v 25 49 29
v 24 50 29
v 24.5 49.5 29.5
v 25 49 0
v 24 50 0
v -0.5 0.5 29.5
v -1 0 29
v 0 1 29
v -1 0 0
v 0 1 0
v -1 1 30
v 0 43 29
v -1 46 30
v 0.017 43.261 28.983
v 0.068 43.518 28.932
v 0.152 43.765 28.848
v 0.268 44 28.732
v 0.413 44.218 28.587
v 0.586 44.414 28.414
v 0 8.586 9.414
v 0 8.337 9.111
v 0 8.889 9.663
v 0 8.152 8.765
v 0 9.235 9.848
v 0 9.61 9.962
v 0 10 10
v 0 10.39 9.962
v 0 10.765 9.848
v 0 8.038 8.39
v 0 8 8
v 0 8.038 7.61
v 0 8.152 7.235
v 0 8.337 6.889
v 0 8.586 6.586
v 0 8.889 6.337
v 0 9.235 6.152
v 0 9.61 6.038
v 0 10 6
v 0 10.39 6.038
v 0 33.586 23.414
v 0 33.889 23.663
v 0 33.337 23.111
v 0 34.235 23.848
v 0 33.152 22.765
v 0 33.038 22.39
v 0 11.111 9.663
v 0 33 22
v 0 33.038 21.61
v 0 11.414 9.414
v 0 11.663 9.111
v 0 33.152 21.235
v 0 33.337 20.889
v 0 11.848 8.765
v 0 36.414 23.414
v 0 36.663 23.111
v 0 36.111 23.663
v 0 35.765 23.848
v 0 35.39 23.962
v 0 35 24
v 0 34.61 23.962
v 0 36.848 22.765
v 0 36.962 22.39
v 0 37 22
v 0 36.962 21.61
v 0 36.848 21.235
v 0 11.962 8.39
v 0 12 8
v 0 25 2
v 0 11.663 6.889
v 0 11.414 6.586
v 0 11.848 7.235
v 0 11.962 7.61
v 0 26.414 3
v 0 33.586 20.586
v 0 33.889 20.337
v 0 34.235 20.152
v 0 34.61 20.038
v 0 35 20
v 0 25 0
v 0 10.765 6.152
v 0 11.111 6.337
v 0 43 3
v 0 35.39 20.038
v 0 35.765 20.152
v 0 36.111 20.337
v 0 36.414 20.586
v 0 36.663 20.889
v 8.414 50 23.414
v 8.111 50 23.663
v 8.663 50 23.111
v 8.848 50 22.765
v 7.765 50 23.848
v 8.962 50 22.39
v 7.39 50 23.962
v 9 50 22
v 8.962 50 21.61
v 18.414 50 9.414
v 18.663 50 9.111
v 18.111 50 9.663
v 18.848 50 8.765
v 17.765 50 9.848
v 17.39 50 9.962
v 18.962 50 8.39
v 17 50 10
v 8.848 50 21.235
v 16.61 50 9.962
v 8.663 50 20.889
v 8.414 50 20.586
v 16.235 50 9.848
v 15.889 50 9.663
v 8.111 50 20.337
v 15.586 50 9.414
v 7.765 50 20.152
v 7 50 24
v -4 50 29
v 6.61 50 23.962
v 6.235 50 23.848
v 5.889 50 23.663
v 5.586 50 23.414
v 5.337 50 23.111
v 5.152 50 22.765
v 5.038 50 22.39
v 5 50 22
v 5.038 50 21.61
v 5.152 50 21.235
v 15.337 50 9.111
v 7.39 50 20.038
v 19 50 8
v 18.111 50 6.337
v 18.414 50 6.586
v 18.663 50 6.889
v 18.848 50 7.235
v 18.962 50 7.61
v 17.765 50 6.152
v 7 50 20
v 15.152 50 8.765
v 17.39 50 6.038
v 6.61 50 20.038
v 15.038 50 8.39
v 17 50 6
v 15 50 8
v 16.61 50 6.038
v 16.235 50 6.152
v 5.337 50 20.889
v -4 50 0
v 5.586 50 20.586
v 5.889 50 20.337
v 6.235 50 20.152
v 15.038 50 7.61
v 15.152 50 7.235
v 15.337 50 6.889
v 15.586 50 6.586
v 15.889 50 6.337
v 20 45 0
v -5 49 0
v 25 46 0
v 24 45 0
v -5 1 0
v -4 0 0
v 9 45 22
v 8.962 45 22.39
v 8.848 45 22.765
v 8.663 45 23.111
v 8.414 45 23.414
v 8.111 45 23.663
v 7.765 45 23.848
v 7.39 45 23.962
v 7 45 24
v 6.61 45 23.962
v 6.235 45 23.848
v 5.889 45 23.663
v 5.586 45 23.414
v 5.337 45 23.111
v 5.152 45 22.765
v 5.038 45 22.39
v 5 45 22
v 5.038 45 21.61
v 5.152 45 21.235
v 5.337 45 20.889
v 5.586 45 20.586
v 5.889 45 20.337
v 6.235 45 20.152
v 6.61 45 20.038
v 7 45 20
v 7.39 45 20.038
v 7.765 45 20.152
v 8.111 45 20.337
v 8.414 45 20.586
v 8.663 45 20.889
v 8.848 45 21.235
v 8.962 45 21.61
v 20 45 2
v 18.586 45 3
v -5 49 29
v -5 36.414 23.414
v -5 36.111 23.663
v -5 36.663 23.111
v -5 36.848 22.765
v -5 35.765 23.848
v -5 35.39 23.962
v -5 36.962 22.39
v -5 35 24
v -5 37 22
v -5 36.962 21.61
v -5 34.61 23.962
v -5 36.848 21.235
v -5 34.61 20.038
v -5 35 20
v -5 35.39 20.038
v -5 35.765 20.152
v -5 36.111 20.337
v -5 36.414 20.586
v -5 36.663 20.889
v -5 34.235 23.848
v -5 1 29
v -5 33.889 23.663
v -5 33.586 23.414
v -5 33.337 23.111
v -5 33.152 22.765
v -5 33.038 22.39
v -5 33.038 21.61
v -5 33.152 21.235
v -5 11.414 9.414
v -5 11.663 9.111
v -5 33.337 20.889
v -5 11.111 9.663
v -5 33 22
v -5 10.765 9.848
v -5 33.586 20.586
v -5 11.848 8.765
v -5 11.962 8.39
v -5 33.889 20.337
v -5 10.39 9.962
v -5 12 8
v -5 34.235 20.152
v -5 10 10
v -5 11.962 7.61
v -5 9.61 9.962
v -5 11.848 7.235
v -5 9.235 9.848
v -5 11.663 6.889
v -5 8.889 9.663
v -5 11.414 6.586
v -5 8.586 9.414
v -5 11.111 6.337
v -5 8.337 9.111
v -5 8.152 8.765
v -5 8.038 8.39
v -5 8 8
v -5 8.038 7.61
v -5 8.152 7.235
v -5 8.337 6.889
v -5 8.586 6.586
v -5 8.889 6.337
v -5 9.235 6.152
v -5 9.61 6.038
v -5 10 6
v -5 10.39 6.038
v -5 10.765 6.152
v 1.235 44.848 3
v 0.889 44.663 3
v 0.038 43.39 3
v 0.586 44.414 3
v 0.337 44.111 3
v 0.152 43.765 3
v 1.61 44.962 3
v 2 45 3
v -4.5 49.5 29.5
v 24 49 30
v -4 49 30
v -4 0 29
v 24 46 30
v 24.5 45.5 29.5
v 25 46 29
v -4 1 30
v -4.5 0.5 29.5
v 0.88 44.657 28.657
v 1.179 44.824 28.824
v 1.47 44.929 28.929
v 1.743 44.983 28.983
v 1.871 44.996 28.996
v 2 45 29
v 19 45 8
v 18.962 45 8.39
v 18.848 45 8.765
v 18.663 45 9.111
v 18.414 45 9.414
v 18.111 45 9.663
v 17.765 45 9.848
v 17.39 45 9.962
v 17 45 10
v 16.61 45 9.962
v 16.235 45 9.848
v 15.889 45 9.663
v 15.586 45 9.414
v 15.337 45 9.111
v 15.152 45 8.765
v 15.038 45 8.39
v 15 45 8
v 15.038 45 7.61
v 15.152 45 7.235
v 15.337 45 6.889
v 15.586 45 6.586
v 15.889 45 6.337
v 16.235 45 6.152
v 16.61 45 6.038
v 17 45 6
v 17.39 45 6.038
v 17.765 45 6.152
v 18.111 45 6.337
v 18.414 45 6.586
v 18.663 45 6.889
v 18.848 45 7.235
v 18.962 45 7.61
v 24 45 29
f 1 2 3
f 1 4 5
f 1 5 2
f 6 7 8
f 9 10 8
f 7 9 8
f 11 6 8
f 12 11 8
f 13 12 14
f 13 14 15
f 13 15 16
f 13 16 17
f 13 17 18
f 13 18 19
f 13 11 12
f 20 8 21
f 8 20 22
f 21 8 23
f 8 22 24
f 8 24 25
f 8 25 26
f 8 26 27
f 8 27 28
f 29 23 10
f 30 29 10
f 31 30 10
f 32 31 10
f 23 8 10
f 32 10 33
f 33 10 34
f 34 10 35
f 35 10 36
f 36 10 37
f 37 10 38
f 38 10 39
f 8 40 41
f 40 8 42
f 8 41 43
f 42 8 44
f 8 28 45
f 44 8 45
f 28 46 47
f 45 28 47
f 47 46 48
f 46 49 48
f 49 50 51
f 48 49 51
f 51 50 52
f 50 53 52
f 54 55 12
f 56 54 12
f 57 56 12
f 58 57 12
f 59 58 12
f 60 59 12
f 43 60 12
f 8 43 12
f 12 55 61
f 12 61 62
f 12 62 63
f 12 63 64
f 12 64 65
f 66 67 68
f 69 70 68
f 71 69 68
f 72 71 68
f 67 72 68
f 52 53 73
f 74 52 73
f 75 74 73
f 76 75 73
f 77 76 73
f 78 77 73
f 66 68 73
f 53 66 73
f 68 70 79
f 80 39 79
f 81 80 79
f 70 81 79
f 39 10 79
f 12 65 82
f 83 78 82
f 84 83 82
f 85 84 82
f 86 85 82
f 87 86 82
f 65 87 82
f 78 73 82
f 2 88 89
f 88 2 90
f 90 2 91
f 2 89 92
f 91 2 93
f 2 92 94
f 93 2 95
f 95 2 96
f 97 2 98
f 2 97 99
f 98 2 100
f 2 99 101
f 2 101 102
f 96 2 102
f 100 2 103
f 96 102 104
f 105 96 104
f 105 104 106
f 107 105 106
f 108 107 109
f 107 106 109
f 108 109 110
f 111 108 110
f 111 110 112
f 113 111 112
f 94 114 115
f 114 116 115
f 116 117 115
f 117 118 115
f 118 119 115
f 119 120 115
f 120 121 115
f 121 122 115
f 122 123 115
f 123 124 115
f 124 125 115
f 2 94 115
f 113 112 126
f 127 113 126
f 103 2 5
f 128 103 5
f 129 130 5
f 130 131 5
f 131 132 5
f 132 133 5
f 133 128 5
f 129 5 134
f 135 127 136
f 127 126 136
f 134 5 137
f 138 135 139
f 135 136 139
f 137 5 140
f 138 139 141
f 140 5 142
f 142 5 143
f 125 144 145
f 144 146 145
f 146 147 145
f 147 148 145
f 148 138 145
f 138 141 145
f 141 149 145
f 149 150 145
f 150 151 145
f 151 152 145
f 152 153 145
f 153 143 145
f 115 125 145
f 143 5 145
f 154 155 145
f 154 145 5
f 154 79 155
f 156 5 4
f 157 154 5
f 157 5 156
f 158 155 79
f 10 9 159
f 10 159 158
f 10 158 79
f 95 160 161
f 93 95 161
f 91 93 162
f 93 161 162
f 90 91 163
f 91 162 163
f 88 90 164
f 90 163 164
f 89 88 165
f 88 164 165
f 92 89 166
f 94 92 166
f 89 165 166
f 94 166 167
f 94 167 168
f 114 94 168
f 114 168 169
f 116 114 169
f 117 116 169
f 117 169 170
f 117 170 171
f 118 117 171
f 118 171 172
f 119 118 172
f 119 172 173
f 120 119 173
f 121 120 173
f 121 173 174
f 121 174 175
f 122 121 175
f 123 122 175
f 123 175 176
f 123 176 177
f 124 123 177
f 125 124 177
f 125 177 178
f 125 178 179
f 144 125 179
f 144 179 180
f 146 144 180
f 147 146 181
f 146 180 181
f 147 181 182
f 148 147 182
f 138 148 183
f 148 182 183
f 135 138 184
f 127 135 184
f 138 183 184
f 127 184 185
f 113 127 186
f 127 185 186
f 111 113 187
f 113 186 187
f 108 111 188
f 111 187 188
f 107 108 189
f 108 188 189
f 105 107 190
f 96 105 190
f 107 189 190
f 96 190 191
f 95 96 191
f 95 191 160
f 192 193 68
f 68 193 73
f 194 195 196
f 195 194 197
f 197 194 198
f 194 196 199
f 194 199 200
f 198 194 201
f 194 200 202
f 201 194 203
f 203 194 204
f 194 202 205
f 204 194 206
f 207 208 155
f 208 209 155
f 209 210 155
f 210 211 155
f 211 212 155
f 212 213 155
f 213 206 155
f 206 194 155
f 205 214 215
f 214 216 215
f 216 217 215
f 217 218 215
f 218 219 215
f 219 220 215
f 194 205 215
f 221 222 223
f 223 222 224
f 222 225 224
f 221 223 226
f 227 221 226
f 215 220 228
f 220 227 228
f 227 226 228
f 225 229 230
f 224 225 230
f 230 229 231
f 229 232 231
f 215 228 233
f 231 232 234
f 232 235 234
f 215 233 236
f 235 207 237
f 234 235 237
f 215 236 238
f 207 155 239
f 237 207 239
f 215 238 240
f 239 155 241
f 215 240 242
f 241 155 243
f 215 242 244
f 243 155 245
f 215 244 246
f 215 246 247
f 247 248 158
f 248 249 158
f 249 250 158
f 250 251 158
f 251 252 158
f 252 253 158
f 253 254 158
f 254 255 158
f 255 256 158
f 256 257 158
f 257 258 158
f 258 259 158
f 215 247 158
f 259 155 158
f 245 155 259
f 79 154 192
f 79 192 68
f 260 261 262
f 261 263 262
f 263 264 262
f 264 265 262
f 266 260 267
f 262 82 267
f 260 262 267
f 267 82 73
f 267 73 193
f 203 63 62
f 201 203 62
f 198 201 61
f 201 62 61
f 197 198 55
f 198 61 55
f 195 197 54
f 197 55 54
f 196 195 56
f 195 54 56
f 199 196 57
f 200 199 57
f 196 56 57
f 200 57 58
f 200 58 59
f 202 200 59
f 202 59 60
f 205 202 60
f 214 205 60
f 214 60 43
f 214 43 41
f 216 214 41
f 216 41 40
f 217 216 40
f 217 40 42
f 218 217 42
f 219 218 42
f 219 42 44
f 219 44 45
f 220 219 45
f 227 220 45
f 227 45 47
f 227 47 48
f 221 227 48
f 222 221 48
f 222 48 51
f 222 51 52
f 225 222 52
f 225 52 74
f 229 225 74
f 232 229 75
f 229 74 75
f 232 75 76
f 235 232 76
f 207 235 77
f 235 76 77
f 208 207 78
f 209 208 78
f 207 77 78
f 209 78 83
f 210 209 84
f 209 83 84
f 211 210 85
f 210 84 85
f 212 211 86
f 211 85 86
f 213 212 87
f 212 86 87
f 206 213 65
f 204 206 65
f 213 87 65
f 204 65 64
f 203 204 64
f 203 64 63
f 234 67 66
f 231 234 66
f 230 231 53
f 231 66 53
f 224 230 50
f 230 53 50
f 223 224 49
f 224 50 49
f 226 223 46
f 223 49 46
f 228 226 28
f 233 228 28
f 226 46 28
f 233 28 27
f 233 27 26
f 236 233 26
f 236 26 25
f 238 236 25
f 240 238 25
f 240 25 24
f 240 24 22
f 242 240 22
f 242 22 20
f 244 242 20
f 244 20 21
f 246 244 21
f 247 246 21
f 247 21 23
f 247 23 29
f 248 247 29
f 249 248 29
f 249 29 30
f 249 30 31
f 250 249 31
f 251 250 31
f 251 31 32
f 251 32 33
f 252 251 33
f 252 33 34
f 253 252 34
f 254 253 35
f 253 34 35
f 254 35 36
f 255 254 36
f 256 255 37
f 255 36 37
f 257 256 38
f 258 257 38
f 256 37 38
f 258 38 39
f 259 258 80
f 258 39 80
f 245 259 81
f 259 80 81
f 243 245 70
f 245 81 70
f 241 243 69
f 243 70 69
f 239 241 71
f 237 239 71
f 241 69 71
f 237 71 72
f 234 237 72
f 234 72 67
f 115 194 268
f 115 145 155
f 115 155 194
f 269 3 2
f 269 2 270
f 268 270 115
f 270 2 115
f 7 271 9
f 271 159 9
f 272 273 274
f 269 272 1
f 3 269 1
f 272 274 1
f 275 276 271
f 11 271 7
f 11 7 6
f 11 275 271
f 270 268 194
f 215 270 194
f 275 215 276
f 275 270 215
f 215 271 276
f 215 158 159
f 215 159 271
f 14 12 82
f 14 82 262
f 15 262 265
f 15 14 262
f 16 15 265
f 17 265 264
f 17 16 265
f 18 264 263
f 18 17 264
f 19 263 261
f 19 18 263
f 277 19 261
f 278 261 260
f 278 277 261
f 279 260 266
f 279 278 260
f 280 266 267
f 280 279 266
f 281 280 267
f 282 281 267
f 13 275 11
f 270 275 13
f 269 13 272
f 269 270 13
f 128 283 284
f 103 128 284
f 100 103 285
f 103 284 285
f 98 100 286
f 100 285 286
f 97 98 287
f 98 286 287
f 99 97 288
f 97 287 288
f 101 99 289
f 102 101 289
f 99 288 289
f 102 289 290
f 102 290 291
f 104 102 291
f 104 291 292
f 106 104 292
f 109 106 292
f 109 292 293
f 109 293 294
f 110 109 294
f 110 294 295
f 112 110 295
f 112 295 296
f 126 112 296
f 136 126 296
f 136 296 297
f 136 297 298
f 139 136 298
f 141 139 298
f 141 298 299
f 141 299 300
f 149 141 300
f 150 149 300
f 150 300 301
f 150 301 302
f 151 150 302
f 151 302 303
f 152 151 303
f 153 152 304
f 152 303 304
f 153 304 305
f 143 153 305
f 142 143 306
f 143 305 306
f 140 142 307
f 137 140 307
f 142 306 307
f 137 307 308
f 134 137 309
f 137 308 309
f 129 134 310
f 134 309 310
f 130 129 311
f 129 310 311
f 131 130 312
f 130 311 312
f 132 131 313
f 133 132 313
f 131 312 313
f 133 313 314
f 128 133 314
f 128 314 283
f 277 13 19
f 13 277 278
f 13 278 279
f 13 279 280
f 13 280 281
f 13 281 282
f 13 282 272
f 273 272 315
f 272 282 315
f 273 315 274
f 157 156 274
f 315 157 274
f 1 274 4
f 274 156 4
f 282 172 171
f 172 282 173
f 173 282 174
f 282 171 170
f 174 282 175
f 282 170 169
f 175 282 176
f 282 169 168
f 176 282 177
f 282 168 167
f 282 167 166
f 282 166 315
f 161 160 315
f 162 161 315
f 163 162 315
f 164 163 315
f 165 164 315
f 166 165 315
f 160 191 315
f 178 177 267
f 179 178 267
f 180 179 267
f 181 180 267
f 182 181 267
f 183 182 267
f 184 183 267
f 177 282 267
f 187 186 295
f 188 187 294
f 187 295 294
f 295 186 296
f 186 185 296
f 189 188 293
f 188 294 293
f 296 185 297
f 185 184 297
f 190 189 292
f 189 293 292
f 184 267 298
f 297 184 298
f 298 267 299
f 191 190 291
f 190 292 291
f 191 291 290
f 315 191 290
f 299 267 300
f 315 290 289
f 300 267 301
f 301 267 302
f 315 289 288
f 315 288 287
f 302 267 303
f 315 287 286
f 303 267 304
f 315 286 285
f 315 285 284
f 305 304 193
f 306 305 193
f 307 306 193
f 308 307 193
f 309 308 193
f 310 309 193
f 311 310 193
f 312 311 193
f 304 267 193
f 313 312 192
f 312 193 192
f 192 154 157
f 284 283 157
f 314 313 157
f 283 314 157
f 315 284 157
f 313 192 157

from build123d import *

# Parameters (mm, degrees)
F1_DEPTH  = 30
F2_R      = 2
F3_DEPTH  = 25
F4_SIZE   = 1
F5_R      = 2
F6_DEPTH  = 25
F7_SIZE   = 1
F8_R      = 2
F10_DEPTH = 3
F11_SIZE  = 1


with BuildPart() as f1:
    # F0 (on Top) → F1 (new body)
    with BuildSketch(Plane.XY):
        Polygon((-5, 0), (0, 0), (0, 45), (25, 45), (25, 50), (-5, 50), align=None)
    extrude(amount=F1_DEPTH)

    # F2 (on face) → F3 (cut)
    with BuildSketch(Plane.XZ.offset(-45)):
        with Locations((7, 22)):
            Circle(F2_R)
        with Locations((17, 8)):
            Circle(F2_R)
    extrude(amount=-F3_DEPTH, mode=Mode.SUBTRACT)

    # F4
    f4_edges = [f1.edges().sort_by_distance(p)[0] for p in [
        (-2.5, 0, 30),
        (0, 22.5, 30),
        (12.5, 45, 30),
        (25, 47.5, 30),
        (10, 50, 30),
        (-5, 25, 30),
    ]]
    chamfer(f4_edges, length=F4_SIZE)

    # F5 (on face) → F6 (cut)
    with BuildSketch(Plane.YZ):
        with Locations((35, 22)):
            Circle(F5_R)
        with Locations((10, 8)):
            Circle(F5_R)
    extrude(amount=-F6_DEPTH, mode=Mode.SUBTRACT)

    # F7
    f7_edges = [f1.edges().sort_by_distance(p)[0] for p in [
        (0, 0, 14.5),
        (-5, 0, 14.5),
        (25, 45, 14.5),
        (25, 50, 14.5),
        (-5, 50, 14.5),
    ]]
    chamfer(f7_edges, length=F7_SIZE)

    # F8
    f8_edges = [f1.edges().sort_by_distance(p)[0] for p in [
        (0, 45, 14.5),
    ]]
    fillet(f8_edges, radius=F8_R)

    # F9 (on face) → F10 (join)
    with BuildSketch(Plane(origin=(0, 0, 0), x_dir=(1, 0, 0), z_dir=(0, 0, -1))):
        Polygon((20, -45), (0, -25), (0, -45), align=None)
    extrude(amount=-F10_DEPTH)

    # F11
    f11_edges = [f1.edges().sort_by_distance(p)[0] for p in [
        (10, 35, 3),
    ]]
    chamfer(f11_edges, length=F11_SIZE)


solid = f1.part
